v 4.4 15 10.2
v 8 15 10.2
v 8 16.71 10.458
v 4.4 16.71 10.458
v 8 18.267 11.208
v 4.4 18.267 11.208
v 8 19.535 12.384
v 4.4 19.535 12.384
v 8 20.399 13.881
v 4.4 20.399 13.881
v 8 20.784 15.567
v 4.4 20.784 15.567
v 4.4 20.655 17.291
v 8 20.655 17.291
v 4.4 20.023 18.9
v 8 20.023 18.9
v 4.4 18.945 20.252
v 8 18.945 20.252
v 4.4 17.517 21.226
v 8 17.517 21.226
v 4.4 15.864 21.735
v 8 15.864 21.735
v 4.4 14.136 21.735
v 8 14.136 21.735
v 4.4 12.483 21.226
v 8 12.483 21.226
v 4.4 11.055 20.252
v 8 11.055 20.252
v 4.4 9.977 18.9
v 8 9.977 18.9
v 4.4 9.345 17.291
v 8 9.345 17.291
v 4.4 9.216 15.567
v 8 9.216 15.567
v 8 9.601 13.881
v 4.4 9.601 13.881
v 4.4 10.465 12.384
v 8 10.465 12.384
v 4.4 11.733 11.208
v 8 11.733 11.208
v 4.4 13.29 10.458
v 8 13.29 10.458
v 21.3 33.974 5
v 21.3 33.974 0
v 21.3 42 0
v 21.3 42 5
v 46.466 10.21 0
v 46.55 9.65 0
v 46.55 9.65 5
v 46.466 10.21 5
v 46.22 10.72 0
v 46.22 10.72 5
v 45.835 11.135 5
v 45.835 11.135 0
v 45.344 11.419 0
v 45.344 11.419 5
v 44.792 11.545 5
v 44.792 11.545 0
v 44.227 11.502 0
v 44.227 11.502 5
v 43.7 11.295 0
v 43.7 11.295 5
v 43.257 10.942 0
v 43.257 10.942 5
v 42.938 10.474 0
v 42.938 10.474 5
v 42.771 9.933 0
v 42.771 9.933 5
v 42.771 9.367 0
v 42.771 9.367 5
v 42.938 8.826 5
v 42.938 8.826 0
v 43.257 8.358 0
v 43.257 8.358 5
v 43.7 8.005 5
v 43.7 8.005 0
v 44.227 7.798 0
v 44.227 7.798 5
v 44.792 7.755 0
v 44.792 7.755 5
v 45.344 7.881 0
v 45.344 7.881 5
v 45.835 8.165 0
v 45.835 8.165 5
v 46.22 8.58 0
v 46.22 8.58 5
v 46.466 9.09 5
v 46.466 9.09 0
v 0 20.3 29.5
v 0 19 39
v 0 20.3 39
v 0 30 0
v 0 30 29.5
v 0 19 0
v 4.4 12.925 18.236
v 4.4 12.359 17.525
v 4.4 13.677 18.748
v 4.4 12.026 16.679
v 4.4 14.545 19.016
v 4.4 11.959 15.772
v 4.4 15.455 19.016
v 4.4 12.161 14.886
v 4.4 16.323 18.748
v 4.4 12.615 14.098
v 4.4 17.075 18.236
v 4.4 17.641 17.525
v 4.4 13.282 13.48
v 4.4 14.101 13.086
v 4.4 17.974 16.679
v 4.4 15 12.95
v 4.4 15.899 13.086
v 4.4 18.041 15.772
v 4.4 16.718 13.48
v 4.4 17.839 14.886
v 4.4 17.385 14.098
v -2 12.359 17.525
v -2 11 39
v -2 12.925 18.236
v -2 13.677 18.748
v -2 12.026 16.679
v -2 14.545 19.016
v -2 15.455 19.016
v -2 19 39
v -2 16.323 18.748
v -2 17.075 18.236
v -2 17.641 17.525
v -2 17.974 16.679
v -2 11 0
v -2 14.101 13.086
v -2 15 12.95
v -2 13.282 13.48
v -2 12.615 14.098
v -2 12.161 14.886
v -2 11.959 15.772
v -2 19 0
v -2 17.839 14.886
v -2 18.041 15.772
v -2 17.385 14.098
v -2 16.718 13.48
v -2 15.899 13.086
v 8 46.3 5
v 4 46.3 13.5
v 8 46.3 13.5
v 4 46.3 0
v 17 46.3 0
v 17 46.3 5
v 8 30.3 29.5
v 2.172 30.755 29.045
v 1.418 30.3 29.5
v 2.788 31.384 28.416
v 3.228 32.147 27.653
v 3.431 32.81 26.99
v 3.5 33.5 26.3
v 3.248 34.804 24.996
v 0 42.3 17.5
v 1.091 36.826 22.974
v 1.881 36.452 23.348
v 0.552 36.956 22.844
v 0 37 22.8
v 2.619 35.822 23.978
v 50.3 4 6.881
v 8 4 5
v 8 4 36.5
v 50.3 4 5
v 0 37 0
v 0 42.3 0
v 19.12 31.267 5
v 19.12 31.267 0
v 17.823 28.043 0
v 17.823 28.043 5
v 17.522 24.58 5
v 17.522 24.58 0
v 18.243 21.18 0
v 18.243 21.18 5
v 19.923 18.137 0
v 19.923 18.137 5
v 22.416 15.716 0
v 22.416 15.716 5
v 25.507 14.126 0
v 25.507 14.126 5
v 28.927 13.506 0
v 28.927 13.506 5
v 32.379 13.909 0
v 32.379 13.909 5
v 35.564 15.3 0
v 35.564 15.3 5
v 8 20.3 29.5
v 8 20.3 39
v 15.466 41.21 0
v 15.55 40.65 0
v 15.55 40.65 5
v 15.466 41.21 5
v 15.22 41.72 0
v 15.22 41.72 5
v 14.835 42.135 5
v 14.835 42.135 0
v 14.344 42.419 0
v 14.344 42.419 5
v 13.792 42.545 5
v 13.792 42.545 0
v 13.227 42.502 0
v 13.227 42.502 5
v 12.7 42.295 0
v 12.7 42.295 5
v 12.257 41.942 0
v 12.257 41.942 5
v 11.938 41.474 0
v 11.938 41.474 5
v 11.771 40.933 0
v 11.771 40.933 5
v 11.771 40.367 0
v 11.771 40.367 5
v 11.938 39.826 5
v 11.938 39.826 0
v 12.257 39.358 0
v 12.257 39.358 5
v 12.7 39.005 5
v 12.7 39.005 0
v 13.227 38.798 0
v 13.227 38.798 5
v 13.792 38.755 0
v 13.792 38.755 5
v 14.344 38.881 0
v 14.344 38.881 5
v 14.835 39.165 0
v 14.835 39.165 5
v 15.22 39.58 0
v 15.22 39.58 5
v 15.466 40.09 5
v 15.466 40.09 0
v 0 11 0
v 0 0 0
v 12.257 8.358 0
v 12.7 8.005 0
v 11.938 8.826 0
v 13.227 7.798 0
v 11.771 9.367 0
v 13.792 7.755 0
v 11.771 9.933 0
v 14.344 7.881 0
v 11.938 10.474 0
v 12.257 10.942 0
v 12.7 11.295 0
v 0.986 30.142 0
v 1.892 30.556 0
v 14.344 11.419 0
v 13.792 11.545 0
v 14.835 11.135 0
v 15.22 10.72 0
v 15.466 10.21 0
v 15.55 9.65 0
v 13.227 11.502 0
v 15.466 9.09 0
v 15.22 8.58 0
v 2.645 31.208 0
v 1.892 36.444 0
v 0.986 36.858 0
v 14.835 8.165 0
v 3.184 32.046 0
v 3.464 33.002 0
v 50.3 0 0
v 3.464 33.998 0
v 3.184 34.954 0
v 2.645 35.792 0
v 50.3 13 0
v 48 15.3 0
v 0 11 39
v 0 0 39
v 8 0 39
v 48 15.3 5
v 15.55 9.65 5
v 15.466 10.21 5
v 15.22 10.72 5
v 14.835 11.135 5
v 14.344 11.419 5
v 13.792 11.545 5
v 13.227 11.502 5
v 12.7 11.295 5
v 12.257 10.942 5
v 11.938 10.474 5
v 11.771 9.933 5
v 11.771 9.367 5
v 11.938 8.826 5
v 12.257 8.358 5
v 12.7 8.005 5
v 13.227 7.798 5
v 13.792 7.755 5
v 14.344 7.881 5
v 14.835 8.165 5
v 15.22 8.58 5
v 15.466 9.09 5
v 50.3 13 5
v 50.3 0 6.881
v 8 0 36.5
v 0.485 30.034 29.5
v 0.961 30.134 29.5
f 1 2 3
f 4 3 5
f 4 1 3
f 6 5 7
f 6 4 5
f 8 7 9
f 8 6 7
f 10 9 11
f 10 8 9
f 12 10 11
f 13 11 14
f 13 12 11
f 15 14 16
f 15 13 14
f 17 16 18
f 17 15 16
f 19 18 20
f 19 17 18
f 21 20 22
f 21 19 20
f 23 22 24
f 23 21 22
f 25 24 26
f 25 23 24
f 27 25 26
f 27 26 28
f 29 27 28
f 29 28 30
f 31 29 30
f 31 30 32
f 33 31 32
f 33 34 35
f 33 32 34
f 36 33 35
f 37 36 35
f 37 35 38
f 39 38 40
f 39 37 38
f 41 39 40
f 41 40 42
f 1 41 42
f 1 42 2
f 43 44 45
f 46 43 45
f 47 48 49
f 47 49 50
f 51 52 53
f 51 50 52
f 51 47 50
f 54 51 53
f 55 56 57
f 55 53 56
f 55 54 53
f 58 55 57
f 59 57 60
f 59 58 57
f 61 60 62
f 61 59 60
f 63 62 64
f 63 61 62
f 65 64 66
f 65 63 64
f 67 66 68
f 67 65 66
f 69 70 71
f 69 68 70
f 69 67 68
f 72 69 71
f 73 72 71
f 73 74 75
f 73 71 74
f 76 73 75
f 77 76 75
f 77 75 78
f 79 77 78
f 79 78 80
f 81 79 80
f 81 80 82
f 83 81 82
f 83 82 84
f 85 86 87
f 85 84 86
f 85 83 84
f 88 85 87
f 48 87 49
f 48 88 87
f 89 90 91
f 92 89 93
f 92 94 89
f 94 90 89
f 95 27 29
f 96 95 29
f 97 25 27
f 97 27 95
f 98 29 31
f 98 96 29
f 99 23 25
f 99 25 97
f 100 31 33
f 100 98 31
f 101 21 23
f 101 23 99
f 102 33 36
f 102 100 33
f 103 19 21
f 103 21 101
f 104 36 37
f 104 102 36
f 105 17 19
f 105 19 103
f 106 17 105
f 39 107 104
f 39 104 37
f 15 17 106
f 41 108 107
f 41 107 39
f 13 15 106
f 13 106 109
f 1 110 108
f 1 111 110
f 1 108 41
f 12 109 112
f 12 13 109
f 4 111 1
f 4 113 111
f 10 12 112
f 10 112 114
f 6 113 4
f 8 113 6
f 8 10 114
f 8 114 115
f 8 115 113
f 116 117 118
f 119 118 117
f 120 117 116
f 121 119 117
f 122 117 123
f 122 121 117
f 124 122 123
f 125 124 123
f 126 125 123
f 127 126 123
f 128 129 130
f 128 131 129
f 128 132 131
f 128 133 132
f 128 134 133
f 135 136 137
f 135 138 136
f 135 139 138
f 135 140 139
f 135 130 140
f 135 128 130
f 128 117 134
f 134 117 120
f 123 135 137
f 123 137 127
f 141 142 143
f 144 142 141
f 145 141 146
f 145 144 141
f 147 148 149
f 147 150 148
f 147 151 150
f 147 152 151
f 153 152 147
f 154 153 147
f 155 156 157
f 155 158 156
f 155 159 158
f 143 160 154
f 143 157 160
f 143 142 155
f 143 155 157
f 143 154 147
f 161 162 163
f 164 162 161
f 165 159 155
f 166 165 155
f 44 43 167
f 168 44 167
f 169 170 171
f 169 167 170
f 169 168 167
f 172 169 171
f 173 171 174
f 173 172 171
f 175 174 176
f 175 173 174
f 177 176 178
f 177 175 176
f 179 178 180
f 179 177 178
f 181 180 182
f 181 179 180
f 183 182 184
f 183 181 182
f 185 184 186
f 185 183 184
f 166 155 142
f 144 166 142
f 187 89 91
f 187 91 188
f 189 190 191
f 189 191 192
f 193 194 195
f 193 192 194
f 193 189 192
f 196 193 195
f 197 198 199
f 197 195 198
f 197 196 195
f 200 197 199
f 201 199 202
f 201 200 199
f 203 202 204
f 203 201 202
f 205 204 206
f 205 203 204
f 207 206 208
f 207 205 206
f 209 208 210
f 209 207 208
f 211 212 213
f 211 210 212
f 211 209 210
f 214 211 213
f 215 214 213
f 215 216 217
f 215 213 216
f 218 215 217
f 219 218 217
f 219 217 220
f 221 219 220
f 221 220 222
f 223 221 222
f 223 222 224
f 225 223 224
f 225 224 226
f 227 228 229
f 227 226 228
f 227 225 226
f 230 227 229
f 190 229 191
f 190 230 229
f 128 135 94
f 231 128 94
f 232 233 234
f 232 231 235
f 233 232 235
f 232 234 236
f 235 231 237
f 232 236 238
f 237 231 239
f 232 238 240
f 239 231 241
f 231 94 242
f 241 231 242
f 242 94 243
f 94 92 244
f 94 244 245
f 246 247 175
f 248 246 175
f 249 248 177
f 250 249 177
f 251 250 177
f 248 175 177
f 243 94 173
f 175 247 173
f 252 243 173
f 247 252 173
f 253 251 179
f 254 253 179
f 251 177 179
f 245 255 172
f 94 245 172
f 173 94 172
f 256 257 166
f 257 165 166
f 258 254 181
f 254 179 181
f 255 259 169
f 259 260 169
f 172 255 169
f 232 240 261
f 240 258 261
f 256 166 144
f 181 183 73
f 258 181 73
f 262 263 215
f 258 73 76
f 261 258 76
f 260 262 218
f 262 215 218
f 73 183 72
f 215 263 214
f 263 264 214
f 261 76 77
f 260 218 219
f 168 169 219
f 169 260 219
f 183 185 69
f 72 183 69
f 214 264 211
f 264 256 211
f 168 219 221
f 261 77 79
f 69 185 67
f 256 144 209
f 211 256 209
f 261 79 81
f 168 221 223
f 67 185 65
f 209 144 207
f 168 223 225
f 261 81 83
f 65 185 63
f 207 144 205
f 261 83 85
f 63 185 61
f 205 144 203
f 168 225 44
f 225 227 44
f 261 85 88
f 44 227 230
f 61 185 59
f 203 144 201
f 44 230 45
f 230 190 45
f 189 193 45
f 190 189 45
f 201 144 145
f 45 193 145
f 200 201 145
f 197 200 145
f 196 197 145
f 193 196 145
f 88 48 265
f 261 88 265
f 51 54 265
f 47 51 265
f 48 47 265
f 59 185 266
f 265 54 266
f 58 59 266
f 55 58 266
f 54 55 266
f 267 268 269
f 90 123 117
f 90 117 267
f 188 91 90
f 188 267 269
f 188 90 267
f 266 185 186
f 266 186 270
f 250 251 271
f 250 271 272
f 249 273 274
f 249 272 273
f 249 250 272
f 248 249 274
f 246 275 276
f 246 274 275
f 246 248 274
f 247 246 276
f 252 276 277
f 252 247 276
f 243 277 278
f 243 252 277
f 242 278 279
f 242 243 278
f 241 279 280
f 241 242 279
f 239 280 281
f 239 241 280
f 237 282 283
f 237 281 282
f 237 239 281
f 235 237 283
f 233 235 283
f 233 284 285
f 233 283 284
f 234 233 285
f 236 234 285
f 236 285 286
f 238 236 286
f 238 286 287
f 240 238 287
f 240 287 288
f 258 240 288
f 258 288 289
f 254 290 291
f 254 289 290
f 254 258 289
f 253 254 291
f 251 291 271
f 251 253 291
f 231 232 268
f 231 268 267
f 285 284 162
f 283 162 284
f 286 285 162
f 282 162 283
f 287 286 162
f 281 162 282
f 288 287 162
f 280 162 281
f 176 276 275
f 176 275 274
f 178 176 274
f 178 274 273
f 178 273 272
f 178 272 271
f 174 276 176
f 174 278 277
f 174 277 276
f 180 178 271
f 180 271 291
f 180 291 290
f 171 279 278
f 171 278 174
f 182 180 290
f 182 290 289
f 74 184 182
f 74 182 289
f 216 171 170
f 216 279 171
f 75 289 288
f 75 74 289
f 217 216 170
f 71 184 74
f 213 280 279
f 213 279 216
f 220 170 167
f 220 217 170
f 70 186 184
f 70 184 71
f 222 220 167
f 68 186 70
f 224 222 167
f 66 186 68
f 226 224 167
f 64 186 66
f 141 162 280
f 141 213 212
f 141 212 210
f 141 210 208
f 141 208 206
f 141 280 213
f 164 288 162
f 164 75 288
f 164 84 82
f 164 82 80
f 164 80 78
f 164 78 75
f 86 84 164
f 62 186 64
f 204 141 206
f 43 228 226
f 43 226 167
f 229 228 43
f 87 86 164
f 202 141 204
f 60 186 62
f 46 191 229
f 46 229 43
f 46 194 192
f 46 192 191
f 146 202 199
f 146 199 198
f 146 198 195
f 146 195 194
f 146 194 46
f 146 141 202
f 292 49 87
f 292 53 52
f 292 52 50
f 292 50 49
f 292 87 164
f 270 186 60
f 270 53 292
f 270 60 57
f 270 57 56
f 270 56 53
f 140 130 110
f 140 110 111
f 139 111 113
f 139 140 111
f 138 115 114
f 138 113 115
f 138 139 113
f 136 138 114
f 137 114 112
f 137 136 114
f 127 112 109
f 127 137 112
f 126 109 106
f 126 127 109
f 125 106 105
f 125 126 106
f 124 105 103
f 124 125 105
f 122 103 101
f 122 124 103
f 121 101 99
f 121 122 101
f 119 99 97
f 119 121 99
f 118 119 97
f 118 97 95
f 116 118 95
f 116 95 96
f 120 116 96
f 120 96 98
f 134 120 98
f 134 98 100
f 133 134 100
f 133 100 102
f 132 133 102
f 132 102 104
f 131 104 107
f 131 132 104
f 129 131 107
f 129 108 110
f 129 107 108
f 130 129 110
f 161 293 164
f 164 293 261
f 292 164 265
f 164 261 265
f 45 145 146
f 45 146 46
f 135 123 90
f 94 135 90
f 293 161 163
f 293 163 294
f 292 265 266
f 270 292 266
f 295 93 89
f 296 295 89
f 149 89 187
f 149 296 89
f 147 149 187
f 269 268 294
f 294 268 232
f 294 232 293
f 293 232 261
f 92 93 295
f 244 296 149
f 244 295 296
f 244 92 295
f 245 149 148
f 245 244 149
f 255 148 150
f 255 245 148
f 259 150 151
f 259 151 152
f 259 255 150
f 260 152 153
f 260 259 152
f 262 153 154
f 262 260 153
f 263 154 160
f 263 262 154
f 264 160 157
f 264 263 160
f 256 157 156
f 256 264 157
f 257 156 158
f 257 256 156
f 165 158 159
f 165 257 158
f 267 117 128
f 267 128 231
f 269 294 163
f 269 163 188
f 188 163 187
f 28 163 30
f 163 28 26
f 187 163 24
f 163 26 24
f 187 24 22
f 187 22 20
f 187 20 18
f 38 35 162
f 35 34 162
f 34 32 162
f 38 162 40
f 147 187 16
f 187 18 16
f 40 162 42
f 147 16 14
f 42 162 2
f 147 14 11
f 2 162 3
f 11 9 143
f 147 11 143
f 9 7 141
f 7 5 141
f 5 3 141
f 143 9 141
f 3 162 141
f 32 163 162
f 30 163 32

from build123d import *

# Parameters (mm, degrees)
CYLINDER002_R           = 3.05
CYLINDER002_DEPTH       = 10
CYLINDER004_R           = 1.9
CYLINDER004_DEPTH       = 20
CYLINDER005_R           = 1.9
CYLINDER005_DEPTH       = 20
CYLINDER003_R           = 1.9
CYLINDER003_DEPTH       = 20
CYLINDER006_R           = 11.8
CYLINDER006_DEPTH       = 10
CYLINDER001_R           = 5.8
CYLINDER001_DEPTH       = 10
CUBE004_W               = 10
CUBE004_H               = 70
CUBE004_DEPTH           = 40
CUBE005_W               = 40
CUBE005_H               = 40
CUBE005_DEPTH           = 10
CUBE006_W               = 15
CUBE006_H               = 15
CUBE006_DEPTH           = 10
CUBE007_W               = 10
CUBE007_H               = 10
CUBE007_DEPTH           = 10
CUBE007_PLACEMENT_ANGLE = 45
CUBE008_W               = 10
CUBE008_H               = 10
CUBE008_DEPTH           = 10
CUBE008_PLACEMENT_ANGLE = 45
CUBE009_W               = 10
CUBE009_H               = 20
CUBE009_DEPTH           = 10
CUBE010_W               = 10
CUBE010_H               = 40
CUBE010_DEPTH           = 40
CUBE010_PLACEMENT_ANGLE = 45
CUBE011_W               = 10
CUBE011_H               = 10
CUBE011_DEPTH           = 39
CUBE011_PLACEMENT_ANGLE = 45
CYLINDER_R              = 3.5
CYLINDER_DEPTH          = 39
CUBE003_W               = 10
CUBE003_H               = 70
CUBE003_DEPTH           = 40
CUBE003_ROLL_ANGLE      = -34.999976
CUBE003_PLACEMENT_ANGLE = -90
CUBE002_W               = 4
CUBE002_H               = 8
CUBE002_DEPTH           = 39
CUBE001_W               = 60
CUBE001_H               = 60
CUBE001_DEPTH           = 60
CUBE_W                  = 50.3
CUBE_H                  = 46.3
CUBE_DEPTH              = 39


with BuildPart() as cylinder002:
    # cylinder002 → cylinder002 (new body)
    with BuildSketch(Plane(origin=(-3, 15, 16), x_dir=(0, 0, -1), z_dir=(1, 0, 0))):
        Circle(CYLINDER002_R)
    extrude(amount=CYLINDER002_DEPTH)


with BuildPart() as cylinder004:
    # cylinder004 → cylinder004 (new body)
    with BuildSketch(Plane(origin=(31, 0, -0.1), x_dir=(1, 0, 0), z_dir=(0, 0, 1))):
        Circle(CYLINDER004_R)
    extrude(amount=CYLINDER004_DEPTH)


with BuildPart() as cylinder005:
    # cylinder005 → cylinder005 (new body)
    with BuildSketch(Plane(origin=(0, 31, -0.1), x_dir=(1, 0, 0), z_dir=(0, 0, 1))):
        Circle(CYLINDER005_R)
    extrude(amount=CYLINDER005_DEPTH)


with BuildPart() as matrix_union:
    # cylinder003 → cylinder003 (new body)
    with BuildSketch(Plane.XY.offset(-0.1)):
        Circle(CYLINDER003_R)
    extrude(amount=CYLINDER003_DEPTH)

    # Matrix_Union: union cylinder004, cylinder005
    add(cylinder004.part)
    add(cylinder005.part)


with BuildPart() as matrix_union_1:
    # Matrix_Union placement: moved
    add(matrix_union.part.moved(Location((13.65, 9.65, -0.1))))


with BuildPart() as cylinder006:
    # cylinder006 → cylinder006 (new body)
    with BuildSketch(Plane(origin=(29.3, 25.3, -0.1), x_dir=(1, 0, 0), z_dir=(0, 0, 1))):
        Circle(CYLINDER006_R)
    extrude(amount=CYLINDER006_DEPTH)


with BuildPart() as group002:
    # cylinder001 → cylinder001 (new body)
    with BuildSketch(Plane(origin=(4.4, 15, 16), x_dir=(0, 0, -1), z_dir=(1, 0, 0))):
        Circle(CYLINDER001_R)
    extrude(amount=CYLINDER001_DEPTH)

    # Group002: union cylinder002, Matrix_Union, cylinder006
    add(cylinder002.part)
    add(matrix_union_1.part)
    add(cylinder006.part)


with BuildPart() as cube004:
    # cube004 → cube004 (new body)
    with BuildSketch(Plane(origin=(8, 5, 36.5), x_dir=(0, -1, 0), z_dir=(0, 0, 1))):
        with Locations((5, 35)):
            Rectangle(CUBE004_W, CUBE004_H)
    extrude(amount=CUBE004_DEPTH)


with BuildPart() as cube005:
    # cube005 → cube005 (new body)
    with BuildSketch(Plane(origin=(21.3, 17.3, -0.1), x_dir=(1, 0, 0), z_dir=(0, 0, 1))):
        with Locations((20, 20)):
            Rectangle(CUBE005_W, CUBE005_H)
    extrude(amount=CUBE005_DEPTH)


with BuildPart() as cube006:
    # cube006 → cube006 (new body)
    with BuildSketch(Plane(origin=(34.3, 15.3, -0.1), x_dir=(1, 0, 0), z_dir=(0, 0, 1))):
        with Locations((7.5, 7.5)):
            Rectangle(CUBE006_W, CUBE006_H)
    extrude(amount=CUBE006_DEPTH)


with BuildPart() as cube007:
    # cube007 → cube007 (new body)
    with BuildSketch(Plane.XY):
        with Locations((5, 5)):
            Rectangle(CUBE007_W, CUBE007_H)
    extrude(amount=CUBE007_DEPTH)


with BuildPart() as cube007_1:
    # cube007 placement: moved
    add(cube007.part.moved(Location((50.3, 13, -0.1))).rotate(Axis((50.3, 13, -0.1), (0, 0, 1)), CUBE007_PLACEMENT_ANGLE))


with BuildPart() as cube008:
    # cube008 → cube008 (new body)
    with BuildSketch(Plane.XY):
        with Locations((5, 5)):
            Rectangle(CUBE008_W, CUBE008_H)
    extrude(amount=CUBE008_DEPTH)


with BuildPart() as cube008_1:
    # cube008 placement: moved
    add(cube008.part.moved(Location((17, 46.3, -0.1))).rotate(Axis((17, 46.3, -0.1), (0, 0, -1)), CUBE008_PLACEMENT_ANGLE))


with BuildPart() as cube009:
    # cube009 → cube009 (new body)
    with BuildSketch(Plane(origin=(-0.1, 20.3, 29.5), x_dir=(1, 0, 0), z_dir=(0, 0, 1))):
        with Locations((5, 10)):
            Rectangle(CUBE009_W, CUBE009_H)
    extrude(amount=CUBE009_DEPTH)


with BuildPart() as cube010:
    # cube010 → cube010 (new body)
    with BuildSketch(Plane.XY):
        with Locations((5, 20)):
            Rectangle(CUBE010_W, CUBE010_H)
    extrude(amount=CUBE010_DEPTH)


with BuildPart() as cube010_1:
    # cube010 placement: moved
    add(cube010.part.moved(Location((-0.1, 30.3, 29.5))).rotate(Axis((-0.1, 30.3, 29.5), (-1, 0, 0)), CUBE010_PLACEMENT_ANGLE))


with BuildPart() as cube011:
    # cube011 → cube011 (new body)
    with BuildSketch(Plane.XY):
        with Locations((5, 5)):
            Rectangle(CUBE011_W, CUBE011_H)
    extrude(amount=CUBE011_DEPTH)


with BuildPart() as cube011_1:
    # cube011 placement: moved
    add(cube011.part.moved(Location((0, 42.3, -0.1))).rotate(Axis((0, 42.3, -0.1), (0, 0, 1)), CUBE011_PLACEMENT_ANGLE))


with BuildPart() as cylinder:
    # cylinder → cylinder (new body)
    with BuildSketch(Plane(origin=(0, 33.5, -0.1), x_dir=(1, 0, 0), z_dir=(0, 0, 1))):
        Circle(CYLINDER_R)
    extrude(amount=CYLINDER_DEPTH)


with BuildPart() as union:
    # cube003 → cube003 (new body)
    with BuildSketch(Plane.XY):
        with Locations((5, 35)):
            Rectangle(CUBE003_W, CUBE003_H)
    extrude(amount=CUBE003_DEPTH)


with BuildPart() as union_1:
    # cube003 roll: moved
    add(union.part.rotate(Axis((0, 0, 0), (1, 0, 0)), CUBE003_ROLL_ANGLE))


with BuildPart() as union_2:
    # cube003 placement: moved
    add(union_1.part.moved(Location((8, 5, 36.5))).rotate(Axis((8, 5, 36.5), (0, 0, 1)), CUBE003_PLACEMENT_ANGLE))

    # Group001: union cube004, cube005, cube006, cube007, cube008, cube009, cube010, cube011, cylinder
    add(cube004.part)
    add(cube005.part)
    add(cube006.part)
    add(cube007_1.part)
    add(cube008_1.part)
    add(cube009.part)
    add(cube010_1.part)
    add(cube011_1.part)
    add(cylinder.part)

    # union: union Group002
    add(group002.part)


with BuildPart() as cube002:
    # cube002 → cube002 (new body)
    with BuildSketch(Plane(origin=(-2, 11, 0), x_dir=(1, 0, 0), z_dir=(0, 0, 1))):
        with Locations((2, 4)):
            Rectangle(CUBE002_W, CUBE002_H)
    extrude(amount=CUBE002_DEPTH)


with BuildPart() as cube001:
    # cube001 → cube001 (new body)
    with BuildSketch(Plane(origin=(8, 4, 5), x_dir=(1, 0, 0), z_dir=(0, 0, 1))):
        with Locations((30, 30)):
            Rectangle(CUBE001_W, CUBE001_H)
    extrude(amount=CUBE001_DEPTH)


with BuildPart() as difference001:
    # cube → cube (new body)
    with BuildSketch(Plane.XY):
        with Locations((25.15, 23.15)):
            Rectangle(CUBE_W, CUBE_H)
    extrude(amount=CUBE_DEPTH)

    # difference: cut cube001
    add(cube001.part, mode=Mode.SUBTRACT)

    # Group: union cube002
    add(cube002.part)

    # difference001: cut union
    add(union_2.part, mode=Mode.SUBTRACT)


solid = difference001.part
